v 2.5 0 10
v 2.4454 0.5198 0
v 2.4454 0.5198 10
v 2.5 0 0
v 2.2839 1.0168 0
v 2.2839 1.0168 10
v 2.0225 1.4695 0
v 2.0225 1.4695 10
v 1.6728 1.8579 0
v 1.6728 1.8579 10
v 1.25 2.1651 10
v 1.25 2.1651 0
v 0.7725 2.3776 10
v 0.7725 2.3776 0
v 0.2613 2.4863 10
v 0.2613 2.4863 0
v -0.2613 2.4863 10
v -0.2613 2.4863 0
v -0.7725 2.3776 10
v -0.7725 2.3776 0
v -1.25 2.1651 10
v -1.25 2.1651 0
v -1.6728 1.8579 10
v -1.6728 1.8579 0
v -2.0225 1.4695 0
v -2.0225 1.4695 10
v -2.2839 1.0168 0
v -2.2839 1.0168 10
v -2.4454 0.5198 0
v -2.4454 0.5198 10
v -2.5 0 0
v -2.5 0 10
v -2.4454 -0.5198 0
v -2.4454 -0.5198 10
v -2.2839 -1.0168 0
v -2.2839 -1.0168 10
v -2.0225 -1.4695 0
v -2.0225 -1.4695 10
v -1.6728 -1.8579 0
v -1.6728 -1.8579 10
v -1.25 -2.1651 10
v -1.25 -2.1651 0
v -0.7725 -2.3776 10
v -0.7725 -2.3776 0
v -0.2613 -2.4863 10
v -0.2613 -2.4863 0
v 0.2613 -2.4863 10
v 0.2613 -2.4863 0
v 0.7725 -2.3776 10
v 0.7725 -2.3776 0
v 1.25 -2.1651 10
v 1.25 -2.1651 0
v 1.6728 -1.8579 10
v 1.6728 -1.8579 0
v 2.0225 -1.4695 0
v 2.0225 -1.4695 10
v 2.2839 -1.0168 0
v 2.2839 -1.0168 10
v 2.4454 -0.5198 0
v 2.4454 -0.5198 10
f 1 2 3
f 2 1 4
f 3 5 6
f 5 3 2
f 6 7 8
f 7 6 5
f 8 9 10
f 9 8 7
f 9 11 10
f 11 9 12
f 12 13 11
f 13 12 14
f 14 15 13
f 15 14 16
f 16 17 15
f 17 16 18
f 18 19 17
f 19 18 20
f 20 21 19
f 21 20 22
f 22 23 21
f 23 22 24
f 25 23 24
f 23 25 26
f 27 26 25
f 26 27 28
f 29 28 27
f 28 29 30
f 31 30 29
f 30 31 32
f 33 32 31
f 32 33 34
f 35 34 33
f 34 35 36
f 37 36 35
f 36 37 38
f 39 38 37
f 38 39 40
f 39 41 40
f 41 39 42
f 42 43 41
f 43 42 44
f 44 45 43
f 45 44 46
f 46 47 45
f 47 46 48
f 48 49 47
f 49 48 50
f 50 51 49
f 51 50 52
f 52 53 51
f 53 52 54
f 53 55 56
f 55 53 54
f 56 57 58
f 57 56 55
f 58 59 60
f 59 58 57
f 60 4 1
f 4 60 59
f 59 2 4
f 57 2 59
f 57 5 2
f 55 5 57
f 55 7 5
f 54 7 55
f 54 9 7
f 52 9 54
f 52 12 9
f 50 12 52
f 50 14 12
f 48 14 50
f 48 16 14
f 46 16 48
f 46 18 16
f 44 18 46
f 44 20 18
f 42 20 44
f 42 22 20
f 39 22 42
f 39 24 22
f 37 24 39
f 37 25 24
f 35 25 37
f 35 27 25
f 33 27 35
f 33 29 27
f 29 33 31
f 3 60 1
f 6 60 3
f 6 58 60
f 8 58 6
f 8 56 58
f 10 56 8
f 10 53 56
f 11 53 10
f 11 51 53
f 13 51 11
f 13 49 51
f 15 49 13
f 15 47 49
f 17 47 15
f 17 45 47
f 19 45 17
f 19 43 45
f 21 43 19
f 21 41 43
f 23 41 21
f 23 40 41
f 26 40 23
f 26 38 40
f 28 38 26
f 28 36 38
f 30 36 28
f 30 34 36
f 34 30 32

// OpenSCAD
module led() {
    $fn = 30;
    cylinder(d=5, h=10);
    // clearance = 6 ?
}

led();
